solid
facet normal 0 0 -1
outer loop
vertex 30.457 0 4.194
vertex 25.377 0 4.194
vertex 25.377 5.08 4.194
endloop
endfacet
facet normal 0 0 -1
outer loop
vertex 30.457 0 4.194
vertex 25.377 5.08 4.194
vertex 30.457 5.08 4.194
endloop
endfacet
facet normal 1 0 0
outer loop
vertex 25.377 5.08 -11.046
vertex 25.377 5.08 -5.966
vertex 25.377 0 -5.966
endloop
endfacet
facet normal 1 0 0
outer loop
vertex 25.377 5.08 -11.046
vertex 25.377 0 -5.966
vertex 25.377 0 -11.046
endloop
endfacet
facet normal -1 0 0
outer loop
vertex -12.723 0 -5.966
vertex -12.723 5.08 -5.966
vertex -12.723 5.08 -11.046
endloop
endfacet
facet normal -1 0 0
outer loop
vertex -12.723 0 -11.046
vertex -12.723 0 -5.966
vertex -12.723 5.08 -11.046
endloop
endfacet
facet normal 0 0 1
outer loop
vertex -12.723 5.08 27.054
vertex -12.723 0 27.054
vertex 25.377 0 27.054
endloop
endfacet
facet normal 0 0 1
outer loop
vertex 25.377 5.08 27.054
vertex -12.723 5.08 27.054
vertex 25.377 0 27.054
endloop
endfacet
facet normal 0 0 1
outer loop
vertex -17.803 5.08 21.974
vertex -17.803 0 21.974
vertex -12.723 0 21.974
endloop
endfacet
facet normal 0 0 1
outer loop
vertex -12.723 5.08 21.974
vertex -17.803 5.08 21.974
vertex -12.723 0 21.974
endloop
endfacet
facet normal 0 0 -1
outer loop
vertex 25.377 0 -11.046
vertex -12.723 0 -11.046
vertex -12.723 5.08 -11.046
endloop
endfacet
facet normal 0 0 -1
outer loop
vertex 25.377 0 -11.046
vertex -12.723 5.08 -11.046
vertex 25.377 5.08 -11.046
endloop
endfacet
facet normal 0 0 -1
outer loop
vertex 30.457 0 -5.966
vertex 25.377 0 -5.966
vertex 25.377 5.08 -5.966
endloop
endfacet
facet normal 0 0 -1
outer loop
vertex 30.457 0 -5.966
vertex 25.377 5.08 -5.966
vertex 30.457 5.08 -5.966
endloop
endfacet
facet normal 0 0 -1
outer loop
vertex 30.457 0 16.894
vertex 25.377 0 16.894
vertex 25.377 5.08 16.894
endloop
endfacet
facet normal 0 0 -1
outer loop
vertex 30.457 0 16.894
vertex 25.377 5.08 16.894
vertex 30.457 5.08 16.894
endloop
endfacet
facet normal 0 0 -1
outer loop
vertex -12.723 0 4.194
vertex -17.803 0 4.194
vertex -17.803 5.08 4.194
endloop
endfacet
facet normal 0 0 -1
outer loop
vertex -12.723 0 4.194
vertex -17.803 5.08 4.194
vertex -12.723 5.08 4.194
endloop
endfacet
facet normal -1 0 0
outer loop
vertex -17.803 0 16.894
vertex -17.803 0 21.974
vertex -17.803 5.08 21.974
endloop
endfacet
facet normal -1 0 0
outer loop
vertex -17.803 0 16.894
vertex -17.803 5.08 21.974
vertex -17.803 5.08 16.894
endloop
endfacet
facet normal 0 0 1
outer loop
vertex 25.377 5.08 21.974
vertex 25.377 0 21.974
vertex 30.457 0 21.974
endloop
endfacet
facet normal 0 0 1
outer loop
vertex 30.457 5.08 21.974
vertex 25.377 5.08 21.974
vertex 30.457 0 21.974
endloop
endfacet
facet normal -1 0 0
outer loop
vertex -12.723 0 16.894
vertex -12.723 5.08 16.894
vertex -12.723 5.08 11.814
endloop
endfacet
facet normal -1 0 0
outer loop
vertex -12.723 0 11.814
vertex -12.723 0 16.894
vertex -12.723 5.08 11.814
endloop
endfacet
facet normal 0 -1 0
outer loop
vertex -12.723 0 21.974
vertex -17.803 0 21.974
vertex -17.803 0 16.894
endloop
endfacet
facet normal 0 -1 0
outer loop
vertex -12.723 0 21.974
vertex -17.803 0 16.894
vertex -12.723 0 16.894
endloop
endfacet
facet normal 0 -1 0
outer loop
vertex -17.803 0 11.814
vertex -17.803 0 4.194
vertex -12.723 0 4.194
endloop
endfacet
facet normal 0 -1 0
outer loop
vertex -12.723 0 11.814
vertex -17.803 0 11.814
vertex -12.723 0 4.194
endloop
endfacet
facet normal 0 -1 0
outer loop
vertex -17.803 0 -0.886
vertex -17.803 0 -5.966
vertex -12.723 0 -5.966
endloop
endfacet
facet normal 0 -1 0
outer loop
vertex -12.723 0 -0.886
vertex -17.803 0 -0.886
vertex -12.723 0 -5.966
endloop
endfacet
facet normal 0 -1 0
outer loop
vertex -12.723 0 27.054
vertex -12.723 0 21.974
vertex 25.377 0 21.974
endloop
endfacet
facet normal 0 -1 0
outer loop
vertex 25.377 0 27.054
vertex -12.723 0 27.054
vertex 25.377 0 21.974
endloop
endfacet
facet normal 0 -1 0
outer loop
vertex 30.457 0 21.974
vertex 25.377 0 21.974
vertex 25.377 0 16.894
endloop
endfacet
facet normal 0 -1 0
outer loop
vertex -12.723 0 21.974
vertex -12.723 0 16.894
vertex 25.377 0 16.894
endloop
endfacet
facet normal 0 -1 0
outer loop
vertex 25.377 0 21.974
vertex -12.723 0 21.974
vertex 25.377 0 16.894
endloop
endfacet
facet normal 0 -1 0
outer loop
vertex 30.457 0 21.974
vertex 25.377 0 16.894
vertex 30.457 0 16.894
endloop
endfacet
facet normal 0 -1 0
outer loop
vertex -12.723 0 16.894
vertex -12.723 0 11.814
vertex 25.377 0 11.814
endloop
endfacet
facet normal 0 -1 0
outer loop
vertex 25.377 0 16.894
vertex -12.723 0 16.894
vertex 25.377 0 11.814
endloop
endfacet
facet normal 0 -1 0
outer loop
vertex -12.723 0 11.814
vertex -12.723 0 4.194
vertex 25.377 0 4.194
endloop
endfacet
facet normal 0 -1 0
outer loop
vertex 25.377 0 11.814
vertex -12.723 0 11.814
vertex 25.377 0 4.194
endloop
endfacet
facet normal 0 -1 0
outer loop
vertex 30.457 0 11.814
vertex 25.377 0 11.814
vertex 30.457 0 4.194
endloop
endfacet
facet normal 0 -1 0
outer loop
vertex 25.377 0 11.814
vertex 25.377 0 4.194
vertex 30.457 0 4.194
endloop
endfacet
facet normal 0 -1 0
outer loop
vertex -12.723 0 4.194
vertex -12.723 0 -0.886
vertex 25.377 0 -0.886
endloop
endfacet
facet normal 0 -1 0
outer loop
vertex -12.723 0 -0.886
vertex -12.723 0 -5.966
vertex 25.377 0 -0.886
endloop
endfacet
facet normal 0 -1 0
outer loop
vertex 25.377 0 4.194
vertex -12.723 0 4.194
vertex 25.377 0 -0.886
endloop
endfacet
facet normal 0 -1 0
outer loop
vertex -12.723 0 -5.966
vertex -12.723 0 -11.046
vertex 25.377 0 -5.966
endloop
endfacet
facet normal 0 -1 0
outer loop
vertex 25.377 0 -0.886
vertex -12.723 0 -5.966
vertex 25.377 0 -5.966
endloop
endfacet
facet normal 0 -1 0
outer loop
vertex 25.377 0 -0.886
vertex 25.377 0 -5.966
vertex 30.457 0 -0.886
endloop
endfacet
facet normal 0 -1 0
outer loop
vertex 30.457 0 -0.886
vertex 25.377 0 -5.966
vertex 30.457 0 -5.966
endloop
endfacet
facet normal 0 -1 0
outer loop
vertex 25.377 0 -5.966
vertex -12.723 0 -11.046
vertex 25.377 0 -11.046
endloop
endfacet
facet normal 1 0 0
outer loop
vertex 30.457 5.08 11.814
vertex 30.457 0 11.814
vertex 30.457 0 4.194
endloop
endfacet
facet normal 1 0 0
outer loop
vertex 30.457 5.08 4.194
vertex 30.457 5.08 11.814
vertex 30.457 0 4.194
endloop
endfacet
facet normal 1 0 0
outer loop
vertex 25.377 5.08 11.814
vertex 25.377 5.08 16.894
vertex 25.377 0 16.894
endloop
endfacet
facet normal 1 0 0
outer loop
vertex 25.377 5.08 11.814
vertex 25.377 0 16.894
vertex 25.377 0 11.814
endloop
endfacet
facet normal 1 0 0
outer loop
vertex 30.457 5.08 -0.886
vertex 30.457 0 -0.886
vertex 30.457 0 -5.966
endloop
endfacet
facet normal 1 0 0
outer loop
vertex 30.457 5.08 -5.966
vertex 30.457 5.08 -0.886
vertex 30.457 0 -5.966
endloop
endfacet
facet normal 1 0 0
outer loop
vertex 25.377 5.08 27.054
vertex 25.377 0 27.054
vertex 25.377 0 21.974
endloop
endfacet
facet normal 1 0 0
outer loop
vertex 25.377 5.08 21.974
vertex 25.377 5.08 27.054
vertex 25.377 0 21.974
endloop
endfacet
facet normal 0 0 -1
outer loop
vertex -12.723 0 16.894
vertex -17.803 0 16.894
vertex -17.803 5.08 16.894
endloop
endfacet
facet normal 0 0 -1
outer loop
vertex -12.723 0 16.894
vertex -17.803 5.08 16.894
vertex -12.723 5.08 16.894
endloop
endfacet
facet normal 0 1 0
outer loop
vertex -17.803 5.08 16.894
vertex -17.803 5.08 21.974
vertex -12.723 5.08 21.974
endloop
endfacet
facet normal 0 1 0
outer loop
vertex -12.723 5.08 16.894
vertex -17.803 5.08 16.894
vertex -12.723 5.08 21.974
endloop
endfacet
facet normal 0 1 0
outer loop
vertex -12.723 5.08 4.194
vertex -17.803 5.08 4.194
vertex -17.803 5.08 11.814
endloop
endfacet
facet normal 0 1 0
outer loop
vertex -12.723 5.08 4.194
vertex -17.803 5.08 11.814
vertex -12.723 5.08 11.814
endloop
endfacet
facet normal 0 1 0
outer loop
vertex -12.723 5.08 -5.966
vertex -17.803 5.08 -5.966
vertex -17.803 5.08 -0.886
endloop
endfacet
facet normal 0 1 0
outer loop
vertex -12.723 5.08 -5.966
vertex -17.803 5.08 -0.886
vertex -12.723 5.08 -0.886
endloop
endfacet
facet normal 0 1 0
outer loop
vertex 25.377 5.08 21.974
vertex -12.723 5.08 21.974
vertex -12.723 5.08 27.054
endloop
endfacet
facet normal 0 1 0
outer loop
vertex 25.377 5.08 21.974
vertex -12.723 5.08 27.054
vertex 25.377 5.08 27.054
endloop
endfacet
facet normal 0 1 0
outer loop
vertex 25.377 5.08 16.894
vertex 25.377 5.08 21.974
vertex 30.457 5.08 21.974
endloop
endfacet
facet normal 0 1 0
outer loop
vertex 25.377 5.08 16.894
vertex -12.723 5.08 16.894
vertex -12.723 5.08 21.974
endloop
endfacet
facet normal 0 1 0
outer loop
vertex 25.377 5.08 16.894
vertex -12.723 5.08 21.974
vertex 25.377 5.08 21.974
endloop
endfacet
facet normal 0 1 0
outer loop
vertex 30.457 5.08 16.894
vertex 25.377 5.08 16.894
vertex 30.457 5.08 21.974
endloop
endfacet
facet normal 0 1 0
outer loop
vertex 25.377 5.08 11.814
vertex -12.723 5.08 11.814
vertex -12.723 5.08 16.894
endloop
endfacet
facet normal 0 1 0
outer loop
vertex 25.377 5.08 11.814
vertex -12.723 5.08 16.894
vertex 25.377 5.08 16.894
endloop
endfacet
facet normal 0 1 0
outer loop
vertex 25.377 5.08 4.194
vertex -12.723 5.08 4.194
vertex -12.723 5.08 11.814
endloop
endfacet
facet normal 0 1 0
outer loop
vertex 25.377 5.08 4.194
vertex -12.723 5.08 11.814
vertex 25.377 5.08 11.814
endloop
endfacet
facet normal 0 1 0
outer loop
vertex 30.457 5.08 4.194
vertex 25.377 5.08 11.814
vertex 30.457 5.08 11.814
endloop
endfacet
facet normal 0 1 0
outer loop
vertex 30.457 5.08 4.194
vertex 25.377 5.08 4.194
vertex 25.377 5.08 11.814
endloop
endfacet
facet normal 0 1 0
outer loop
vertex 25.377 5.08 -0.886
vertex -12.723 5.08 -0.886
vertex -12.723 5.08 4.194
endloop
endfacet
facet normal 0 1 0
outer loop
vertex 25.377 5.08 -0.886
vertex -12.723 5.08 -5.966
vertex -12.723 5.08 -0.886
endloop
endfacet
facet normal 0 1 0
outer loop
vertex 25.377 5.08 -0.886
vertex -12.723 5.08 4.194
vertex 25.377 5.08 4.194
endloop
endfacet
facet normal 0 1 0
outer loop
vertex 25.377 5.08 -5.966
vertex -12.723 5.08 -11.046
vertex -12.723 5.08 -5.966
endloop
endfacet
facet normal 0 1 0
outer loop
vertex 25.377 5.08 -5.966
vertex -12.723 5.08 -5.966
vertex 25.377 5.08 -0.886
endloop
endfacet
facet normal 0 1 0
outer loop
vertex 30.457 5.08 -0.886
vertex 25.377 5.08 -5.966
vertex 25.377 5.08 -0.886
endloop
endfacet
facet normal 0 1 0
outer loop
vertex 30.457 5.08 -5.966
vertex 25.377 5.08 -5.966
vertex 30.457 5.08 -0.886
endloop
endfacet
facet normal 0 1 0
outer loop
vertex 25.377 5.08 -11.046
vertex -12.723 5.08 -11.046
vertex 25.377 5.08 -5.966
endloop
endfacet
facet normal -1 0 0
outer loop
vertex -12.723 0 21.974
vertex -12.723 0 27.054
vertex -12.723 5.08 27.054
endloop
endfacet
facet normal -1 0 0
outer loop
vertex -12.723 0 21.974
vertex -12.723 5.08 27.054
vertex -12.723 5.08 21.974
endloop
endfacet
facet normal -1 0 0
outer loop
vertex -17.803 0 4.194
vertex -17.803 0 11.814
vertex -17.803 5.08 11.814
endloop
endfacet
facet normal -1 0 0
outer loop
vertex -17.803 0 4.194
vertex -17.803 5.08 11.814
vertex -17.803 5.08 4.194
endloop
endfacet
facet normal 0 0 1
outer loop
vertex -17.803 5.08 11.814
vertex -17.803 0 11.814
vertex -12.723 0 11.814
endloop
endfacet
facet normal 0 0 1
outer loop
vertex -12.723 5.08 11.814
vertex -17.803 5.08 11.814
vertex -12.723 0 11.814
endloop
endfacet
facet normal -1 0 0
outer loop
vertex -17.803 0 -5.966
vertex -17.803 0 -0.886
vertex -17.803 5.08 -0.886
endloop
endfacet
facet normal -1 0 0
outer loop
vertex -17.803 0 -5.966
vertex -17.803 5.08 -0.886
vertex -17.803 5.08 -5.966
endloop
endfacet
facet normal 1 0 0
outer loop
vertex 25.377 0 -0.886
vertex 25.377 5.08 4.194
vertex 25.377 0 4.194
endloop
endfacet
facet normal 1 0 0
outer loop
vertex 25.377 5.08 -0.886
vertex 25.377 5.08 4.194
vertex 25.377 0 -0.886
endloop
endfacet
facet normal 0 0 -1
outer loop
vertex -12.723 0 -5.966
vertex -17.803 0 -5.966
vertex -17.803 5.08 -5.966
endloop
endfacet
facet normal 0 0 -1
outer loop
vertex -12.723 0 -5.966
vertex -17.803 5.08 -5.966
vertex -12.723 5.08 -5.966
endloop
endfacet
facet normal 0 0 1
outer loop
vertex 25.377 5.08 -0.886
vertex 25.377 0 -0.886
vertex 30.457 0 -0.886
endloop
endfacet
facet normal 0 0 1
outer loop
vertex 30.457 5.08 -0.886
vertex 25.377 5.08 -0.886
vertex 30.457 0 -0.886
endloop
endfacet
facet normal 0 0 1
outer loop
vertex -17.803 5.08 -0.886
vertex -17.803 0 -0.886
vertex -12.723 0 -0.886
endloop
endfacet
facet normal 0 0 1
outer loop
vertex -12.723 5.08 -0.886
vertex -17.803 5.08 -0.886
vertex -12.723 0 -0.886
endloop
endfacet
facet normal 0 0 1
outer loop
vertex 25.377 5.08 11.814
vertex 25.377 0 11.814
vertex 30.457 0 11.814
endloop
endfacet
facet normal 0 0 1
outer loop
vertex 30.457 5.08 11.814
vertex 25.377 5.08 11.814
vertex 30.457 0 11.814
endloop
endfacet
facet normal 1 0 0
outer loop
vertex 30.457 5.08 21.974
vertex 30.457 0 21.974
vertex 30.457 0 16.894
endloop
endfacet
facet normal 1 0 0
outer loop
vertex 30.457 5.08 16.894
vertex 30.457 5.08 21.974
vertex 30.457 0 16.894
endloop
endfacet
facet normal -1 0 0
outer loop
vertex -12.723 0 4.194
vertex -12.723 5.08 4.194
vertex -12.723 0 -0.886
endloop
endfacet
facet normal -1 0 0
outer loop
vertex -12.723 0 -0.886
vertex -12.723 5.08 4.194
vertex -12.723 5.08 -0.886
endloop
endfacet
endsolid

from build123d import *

# Parameters (mm, degrees)
SKETCH1_W           = 48.26
SKETCH1_H           = 38.1
BOSS_EXTRUDE1_DEPTH = 5.08
SKETCH2_W           = 5.08
SKETCH2_H           = 5.08
CUT_EXTRUDE1_DEPTH  = 5.08


with BuildPart() as part:
    # Sketch1 → Boss-Extrude1 (new body)
    with BuildSketch(Plane(origin=(0, 0, 0), x_dir=(1, 0, 0), z_dir=(0, 1, 0))):
        with Locations((6.327422222, -8.003822222)):
            Rectangle(SKETCH1_W, SKETCH1_H)
    extrude(amount=BOSS_EXTRUDE1_DEPTH)

    # Sketch2 → Cut-Extrude1 (cut)
    with BuildSketch(Plane(origin=(0, 5.08, 0), x_dir=(1, 0, 0), z_dir=(0, 1, 0))):
        with Locations((27.917422222, -24.513822222)):
            Rectangle(SKETCH2_W, SKETCH2_H)
        with Locations((27.917422222, -14.353822222)):
            Rectangle(SKETCH2_W, SKETCH2_H)
        with Locations((-15.262577778, 8.506177778)):
            Rectangle(SKETCH2_W, SKETCH2_H)
        with Locations((-15.262577778, -1.653822222)):
            Rectangle(SKETCH2_W, SKETCH2_H)
        with Locations((-15.262577778, -24.513822222)):
            Rectangle(SKETCH2_W, SKETCH2_H)
        with Locations((-15.262577778, -14.353822222)):
            Rectangle(SKETCH2_W, SKETCH2_H)
        with Locations((27.917422222, -1.653822222)):
            Rectangle(SKETCH2_W, SKETCH2_H)
        with Locations((27.917422222, 8.506177778)):
            Rectangle(SKETCH2_W, SKETCH2_H)
    extrude(amount=-CUT_EXTRUDE1_DEPTH, mode=Mode.SUBTRACT)


solid = part.part
